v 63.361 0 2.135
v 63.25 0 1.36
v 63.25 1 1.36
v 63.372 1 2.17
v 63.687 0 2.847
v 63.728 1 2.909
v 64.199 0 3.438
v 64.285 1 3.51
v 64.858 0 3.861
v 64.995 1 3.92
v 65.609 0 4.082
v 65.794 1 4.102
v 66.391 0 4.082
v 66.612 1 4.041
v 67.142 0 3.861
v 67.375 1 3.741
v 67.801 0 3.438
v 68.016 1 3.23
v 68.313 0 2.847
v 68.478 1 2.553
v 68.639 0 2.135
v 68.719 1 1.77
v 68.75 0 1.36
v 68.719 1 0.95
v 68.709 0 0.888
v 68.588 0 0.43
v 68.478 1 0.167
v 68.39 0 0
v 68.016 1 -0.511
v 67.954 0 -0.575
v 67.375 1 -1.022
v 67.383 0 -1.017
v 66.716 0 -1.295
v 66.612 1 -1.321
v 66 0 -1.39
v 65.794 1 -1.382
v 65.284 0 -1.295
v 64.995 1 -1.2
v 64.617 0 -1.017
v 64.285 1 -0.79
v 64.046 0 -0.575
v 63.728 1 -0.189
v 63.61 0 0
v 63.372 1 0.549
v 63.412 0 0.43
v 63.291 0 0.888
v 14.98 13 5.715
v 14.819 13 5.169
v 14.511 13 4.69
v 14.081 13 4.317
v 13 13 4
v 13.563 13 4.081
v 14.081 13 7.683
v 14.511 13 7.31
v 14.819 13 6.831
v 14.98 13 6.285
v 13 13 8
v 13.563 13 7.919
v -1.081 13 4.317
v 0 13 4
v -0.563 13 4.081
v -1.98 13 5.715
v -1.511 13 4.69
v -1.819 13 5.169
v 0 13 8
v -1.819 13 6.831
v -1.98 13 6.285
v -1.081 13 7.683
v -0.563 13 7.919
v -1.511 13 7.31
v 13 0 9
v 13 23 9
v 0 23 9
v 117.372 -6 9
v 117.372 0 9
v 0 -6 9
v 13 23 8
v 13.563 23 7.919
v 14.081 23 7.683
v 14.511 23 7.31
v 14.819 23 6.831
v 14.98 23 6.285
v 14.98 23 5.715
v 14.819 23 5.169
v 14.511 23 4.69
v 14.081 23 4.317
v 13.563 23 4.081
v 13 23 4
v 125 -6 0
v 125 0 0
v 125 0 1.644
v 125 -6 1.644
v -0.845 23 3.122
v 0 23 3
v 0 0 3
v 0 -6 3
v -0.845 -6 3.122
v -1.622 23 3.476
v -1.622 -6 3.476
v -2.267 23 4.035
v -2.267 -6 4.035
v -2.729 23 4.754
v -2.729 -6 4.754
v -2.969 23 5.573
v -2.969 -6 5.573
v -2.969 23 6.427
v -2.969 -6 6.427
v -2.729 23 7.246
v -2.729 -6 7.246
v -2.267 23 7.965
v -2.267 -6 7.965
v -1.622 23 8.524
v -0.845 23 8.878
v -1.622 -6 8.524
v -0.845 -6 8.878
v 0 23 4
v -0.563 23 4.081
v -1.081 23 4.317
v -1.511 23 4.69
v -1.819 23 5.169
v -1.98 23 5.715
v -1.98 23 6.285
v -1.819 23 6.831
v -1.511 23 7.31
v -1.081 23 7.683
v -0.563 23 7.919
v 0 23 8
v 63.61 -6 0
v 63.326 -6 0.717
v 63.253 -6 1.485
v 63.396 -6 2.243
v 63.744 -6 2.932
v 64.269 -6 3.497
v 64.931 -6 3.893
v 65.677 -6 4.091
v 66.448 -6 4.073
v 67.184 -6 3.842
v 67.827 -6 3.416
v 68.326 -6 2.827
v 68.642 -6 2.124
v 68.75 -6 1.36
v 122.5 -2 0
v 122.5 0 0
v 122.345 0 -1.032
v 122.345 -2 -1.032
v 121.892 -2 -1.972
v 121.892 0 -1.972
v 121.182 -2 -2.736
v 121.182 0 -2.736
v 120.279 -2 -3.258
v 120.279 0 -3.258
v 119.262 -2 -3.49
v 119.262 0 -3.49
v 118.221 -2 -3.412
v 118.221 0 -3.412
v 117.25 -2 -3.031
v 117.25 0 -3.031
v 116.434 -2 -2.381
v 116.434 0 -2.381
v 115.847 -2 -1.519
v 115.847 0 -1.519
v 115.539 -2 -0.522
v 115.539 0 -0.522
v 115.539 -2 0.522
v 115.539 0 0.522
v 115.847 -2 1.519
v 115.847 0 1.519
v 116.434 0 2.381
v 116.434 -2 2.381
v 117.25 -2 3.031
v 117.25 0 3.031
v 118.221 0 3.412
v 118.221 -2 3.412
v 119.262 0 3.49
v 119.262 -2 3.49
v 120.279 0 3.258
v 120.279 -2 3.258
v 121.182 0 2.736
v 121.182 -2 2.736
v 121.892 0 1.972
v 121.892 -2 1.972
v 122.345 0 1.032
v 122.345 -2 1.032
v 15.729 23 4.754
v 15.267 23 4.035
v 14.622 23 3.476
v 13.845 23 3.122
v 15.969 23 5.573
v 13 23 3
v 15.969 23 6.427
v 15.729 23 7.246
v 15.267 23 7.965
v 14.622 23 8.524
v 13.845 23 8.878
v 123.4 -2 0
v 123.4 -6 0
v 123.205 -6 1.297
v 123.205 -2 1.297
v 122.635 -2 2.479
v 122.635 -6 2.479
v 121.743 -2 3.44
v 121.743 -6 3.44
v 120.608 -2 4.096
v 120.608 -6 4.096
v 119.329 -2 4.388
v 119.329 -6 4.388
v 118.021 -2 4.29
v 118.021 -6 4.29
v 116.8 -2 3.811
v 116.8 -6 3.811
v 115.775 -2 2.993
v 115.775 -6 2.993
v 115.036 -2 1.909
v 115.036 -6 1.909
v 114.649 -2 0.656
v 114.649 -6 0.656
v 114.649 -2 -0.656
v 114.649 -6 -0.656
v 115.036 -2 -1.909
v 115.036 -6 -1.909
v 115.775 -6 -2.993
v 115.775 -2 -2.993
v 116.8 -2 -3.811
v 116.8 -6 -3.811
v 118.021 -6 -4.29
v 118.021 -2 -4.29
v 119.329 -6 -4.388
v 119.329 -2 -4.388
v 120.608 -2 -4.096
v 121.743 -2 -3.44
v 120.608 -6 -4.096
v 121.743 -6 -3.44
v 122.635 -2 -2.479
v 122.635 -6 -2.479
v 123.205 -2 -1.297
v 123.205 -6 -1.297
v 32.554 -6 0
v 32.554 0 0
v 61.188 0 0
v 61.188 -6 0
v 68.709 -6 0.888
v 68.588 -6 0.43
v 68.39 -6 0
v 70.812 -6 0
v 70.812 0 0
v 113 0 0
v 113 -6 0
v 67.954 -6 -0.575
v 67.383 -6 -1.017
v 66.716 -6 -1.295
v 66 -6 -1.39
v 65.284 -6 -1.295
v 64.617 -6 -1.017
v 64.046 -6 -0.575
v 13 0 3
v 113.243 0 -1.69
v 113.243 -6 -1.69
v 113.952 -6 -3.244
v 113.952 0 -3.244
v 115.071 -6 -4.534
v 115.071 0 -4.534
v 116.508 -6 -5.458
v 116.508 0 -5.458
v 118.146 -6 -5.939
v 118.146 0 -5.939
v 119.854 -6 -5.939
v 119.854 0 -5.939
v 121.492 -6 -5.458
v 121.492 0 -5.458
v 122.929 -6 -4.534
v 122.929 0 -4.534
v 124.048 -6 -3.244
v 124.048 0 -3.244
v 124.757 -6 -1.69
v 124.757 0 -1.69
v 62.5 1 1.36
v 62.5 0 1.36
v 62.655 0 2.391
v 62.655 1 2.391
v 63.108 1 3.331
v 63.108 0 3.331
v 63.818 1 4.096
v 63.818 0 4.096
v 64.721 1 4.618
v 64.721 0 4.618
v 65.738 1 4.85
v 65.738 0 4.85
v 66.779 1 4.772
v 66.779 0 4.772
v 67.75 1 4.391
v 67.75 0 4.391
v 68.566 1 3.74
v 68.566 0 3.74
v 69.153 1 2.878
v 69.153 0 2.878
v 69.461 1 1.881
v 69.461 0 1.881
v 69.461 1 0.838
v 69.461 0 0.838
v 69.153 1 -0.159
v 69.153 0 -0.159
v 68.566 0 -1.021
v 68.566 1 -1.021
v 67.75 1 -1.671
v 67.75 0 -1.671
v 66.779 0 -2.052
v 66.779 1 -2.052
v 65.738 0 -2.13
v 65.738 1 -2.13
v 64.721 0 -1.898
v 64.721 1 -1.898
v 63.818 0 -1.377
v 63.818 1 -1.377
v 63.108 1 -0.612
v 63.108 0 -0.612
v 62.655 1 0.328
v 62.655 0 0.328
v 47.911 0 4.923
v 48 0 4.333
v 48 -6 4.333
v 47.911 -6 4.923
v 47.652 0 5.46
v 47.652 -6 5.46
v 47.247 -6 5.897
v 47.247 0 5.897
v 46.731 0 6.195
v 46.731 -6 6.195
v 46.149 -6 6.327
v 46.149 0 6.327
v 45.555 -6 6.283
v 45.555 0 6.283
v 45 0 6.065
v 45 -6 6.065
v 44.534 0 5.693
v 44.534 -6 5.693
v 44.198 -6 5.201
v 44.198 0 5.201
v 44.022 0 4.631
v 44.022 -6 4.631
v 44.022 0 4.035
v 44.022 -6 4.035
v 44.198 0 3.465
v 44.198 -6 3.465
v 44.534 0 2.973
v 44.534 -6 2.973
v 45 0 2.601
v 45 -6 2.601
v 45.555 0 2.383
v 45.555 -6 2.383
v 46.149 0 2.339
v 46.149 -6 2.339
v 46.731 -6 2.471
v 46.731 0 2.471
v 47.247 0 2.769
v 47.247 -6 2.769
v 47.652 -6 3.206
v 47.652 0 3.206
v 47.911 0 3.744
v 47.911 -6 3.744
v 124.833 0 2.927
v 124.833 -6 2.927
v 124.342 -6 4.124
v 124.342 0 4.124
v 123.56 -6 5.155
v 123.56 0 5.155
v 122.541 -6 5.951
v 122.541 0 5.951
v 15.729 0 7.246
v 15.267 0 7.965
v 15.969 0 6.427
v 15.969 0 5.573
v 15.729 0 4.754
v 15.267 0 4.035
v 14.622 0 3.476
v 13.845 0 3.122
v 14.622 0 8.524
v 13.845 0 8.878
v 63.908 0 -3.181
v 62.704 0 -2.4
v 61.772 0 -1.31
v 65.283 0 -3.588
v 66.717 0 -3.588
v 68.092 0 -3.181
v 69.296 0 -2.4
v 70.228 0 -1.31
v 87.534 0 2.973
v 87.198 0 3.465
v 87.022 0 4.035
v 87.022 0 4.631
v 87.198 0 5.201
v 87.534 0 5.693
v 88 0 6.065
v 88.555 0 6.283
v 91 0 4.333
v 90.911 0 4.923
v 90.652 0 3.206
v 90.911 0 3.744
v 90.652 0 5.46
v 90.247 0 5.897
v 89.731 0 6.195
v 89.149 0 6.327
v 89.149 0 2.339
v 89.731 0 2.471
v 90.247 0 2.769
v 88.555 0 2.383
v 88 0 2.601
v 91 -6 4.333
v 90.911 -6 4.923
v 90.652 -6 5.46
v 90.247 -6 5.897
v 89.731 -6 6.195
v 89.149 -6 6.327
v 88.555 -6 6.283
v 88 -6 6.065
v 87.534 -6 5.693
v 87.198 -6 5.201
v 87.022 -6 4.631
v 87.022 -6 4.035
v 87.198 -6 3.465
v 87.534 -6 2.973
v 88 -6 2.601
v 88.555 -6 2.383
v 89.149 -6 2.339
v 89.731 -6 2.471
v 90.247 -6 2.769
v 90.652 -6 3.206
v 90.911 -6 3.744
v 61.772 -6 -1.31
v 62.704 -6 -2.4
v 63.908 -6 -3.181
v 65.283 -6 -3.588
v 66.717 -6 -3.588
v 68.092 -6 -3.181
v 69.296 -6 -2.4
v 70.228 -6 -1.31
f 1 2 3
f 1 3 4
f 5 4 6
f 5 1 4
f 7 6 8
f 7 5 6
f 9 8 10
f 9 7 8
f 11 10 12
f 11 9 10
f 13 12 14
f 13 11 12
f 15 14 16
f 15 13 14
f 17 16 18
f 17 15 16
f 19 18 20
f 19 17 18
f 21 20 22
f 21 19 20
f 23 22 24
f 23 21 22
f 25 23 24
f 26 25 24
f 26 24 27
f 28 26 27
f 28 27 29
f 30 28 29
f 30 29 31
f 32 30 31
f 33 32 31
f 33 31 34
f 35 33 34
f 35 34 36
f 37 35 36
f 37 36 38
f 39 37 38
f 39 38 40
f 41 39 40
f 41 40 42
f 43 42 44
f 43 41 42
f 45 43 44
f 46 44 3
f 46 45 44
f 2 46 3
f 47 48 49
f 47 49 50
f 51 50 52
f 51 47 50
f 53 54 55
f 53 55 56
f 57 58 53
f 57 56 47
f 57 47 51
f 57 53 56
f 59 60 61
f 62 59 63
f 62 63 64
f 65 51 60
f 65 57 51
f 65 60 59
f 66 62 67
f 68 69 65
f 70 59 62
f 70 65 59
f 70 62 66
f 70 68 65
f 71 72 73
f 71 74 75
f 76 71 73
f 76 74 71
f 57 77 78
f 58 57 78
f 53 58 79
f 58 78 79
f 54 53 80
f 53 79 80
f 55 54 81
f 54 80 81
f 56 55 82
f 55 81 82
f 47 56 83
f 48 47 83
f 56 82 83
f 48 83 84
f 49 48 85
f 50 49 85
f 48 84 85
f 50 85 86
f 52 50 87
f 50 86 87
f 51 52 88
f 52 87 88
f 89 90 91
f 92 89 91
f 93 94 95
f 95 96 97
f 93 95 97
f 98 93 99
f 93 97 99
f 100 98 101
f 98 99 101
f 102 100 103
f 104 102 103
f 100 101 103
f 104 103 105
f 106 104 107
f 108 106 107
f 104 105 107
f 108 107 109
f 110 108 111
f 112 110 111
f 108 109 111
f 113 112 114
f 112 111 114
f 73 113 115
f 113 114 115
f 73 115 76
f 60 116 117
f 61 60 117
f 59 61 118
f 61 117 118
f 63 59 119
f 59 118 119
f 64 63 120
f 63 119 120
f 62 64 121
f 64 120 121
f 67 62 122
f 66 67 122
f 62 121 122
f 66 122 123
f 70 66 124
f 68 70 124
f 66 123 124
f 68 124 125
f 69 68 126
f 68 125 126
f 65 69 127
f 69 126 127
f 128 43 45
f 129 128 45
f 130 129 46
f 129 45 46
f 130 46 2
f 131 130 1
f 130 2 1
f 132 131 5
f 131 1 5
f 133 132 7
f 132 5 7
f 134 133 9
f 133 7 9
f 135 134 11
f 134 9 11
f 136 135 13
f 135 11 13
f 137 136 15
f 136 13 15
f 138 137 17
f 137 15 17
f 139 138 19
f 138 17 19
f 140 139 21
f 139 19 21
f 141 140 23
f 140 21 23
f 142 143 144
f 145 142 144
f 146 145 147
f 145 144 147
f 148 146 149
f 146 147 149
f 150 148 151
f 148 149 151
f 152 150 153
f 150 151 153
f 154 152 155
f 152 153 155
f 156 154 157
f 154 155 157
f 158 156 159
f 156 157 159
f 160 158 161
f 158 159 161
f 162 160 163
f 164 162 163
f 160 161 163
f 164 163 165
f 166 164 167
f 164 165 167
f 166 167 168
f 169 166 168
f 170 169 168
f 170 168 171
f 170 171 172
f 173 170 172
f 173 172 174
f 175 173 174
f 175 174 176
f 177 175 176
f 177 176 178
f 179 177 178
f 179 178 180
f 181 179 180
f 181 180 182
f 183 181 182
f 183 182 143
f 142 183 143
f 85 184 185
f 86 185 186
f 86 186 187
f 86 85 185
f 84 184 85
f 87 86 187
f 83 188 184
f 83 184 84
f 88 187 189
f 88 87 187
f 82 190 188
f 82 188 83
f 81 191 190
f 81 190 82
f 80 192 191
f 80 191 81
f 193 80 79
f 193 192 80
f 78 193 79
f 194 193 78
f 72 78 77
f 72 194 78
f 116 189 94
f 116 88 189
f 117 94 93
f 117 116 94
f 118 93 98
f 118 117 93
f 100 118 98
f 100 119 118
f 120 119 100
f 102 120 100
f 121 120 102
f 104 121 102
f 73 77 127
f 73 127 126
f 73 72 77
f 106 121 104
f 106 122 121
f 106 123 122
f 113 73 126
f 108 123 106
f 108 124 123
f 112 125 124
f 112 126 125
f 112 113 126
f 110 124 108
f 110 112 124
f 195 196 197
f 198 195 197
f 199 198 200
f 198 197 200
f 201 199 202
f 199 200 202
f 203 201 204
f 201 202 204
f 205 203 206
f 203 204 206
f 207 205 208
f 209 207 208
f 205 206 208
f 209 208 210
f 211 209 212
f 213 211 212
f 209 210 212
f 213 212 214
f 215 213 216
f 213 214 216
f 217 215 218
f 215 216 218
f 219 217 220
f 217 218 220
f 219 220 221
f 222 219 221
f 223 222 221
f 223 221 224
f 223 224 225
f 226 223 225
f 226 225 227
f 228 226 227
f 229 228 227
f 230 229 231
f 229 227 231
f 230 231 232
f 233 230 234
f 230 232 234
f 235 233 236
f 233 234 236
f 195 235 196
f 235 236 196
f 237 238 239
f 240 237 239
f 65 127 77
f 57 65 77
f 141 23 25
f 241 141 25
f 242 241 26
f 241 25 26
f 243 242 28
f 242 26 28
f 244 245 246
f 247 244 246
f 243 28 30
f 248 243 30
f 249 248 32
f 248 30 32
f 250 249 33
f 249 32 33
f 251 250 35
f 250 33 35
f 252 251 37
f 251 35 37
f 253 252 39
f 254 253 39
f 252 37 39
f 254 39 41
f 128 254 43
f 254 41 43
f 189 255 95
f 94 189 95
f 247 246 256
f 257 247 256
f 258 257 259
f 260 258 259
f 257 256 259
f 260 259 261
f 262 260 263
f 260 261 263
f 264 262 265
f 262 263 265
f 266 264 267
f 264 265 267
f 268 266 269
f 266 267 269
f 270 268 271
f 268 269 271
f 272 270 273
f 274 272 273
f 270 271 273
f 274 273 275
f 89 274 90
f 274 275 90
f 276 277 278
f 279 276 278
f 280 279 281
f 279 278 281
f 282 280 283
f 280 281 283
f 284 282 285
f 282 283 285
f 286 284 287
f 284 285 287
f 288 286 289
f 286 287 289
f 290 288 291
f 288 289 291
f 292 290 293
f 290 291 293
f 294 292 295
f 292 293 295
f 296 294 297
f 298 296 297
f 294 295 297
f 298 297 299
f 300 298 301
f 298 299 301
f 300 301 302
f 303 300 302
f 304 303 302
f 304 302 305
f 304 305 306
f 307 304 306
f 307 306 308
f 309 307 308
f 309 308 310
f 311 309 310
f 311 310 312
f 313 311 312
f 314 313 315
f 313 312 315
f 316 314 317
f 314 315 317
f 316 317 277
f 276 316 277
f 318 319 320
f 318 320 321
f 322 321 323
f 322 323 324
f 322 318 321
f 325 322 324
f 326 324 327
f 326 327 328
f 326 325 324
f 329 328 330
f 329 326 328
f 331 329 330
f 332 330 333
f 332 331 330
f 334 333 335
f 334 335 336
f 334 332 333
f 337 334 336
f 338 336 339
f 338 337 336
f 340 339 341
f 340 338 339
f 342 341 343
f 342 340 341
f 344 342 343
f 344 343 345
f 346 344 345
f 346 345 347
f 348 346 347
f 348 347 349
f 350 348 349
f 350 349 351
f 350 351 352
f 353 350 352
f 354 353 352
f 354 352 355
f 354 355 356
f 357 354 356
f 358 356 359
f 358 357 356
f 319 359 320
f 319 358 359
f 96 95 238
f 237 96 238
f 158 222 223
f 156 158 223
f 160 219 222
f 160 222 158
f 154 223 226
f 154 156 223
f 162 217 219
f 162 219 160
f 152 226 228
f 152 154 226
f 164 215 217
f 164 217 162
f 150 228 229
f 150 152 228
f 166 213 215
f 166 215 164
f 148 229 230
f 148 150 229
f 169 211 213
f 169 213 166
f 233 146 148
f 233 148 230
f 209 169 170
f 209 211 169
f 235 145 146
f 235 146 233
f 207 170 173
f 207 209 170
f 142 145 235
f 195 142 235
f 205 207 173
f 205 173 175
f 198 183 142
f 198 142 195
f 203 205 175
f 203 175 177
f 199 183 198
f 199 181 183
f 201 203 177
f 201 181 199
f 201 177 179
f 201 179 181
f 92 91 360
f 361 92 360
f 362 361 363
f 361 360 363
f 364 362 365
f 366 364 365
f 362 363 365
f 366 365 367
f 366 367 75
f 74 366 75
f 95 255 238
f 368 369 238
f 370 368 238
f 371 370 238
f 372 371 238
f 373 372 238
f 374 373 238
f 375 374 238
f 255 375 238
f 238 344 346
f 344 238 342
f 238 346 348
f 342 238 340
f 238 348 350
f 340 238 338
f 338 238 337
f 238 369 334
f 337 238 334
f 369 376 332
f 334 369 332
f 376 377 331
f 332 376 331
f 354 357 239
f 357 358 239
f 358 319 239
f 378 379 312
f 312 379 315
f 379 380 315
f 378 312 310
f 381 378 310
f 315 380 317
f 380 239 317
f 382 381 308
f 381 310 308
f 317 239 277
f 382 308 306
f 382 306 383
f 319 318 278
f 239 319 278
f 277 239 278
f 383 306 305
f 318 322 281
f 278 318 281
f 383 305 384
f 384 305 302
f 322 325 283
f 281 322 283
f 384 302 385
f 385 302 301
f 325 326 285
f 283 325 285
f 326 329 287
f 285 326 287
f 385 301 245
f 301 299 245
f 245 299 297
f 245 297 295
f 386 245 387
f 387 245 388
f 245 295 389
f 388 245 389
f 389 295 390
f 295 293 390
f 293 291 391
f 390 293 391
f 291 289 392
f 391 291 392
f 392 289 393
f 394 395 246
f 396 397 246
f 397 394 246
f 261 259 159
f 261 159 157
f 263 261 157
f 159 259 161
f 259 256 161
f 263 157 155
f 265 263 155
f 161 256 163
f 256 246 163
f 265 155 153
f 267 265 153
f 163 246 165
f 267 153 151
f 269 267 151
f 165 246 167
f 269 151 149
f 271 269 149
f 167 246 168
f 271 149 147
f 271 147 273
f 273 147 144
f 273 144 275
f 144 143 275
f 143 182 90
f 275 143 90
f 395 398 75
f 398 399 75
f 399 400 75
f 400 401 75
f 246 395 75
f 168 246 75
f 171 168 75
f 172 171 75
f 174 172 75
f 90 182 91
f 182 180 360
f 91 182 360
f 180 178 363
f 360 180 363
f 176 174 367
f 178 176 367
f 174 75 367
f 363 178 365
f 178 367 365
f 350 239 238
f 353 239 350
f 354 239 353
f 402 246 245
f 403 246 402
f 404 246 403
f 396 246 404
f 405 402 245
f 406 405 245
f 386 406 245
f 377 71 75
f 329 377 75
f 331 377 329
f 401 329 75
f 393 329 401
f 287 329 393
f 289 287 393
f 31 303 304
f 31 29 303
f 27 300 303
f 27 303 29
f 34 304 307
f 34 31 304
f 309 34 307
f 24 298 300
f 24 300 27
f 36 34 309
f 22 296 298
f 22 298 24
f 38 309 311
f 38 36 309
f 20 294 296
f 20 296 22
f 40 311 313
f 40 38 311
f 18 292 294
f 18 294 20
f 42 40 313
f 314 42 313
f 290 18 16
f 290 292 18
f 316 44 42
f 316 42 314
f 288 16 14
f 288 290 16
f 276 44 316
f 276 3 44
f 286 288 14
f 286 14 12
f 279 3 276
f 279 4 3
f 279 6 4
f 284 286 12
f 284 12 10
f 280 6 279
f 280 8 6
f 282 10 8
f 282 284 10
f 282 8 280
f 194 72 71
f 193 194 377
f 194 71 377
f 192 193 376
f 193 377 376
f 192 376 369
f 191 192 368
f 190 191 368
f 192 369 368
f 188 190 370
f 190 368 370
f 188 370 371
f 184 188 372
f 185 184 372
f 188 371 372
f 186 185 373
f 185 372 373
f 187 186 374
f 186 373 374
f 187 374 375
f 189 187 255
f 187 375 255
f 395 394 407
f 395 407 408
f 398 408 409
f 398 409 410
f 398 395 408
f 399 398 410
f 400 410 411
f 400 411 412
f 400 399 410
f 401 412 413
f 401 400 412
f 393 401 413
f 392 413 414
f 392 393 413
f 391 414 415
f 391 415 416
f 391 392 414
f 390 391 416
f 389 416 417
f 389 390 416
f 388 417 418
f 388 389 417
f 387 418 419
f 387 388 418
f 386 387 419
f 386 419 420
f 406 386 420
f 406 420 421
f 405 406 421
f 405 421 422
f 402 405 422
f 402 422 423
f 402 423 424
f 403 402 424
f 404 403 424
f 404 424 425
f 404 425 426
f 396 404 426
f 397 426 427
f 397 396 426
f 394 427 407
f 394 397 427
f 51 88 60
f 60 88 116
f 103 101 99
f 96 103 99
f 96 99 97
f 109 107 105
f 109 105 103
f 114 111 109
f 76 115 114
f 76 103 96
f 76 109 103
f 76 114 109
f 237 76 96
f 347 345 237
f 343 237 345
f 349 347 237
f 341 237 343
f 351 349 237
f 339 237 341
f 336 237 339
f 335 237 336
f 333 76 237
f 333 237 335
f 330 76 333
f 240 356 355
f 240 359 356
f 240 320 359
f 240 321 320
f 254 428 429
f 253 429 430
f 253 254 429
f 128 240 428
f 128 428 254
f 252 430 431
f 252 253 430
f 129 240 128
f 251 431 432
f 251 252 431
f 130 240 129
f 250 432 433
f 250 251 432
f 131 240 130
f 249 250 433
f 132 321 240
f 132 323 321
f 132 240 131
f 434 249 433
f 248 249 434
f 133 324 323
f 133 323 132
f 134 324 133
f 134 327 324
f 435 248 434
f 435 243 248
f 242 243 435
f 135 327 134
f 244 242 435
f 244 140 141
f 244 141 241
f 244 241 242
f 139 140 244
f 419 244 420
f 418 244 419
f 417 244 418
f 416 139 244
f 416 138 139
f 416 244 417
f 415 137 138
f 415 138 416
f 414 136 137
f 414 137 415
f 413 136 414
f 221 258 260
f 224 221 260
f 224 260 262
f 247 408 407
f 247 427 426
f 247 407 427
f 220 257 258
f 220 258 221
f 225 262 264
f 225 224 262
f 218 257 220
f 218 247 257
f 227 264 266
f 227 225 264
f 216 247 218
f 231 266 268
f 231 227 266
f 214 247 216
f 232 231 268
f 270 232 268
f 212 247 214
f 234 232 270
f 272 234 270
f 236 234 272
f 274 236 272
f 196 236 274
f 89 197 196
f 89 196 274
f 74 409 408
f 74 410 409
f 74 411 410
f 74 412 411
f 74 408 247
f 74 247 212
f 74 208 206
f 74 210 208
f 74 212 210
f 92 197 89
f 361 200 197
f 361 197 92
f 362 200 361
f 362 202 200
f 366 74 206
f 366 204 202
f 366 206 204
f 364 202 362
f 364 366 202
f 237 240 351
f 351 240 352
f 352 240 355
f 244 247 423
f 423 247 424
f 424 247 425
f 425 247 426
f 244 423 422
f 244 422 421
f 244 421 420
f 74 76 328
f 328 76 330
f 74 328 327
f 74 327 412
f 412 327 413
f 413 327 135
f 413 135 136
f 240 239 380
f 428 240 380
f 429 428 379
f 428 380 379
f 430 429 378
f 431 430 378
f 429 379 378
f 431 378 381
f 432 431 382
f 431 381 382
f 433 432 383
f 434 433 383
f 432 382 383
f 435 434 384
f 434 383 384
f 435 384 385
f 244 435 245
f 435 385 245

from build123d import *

# Parameters (mm, degrees)
F0_R     = 2
F1_DEPTH = 6
F2_R     = 3.5
F2_R_2   = 2.75
F3_DEPTH = 1
F4_R     = 4.4
F5_DEPTH = 4
F6_W     = 13
F6_H     = 6
F7_DEPTH = 23
F9_DEPTH = 10


with BuildPart() as f1:
    # F0 (on Front) → F1 (new body)
    with BuildSketch(Plane.XZ):
        with BuildLine():
            Line((0, 3), (32.554146, 0))
            Line((32.554146, 0), (61.188469, 0))
            Line((61.188469, 0), (63.609742, 0))
            ThreePointArc((63.609742, 0), (65.29669, 4.018384), (68.75, 1.359841))
            ThreePointArc((68.75, 1.359841), (68.658544, 0.65653), (68.390258, 0))
            Line((68.390258, 0), (70.811531, 0))
            Line((70.811531, 0), (113, 0))
            Line((113, 0), (115.5, 0))
            ThreePointArc((115.5, 0), (119, 3.5), (122.5, 0))
            Line((122.5, 0), (125, 0))
            Line((125, 0), (125, 1.644468))
            ThreePointArc((125, 1.644468), (124.341818, 4.124108), (122.540554, 5.950927))
            Line((122.540554, 5.950927), (117.372112, 9))
            Line((117.372112, 9), (0, 9))
            Line((0, 9), (0, 3))
        make_face()
        with Locations((46, 4.333029)):
            Circle(F0_R, mode=Mode.SUBTRACT)
        with Locations((89, 4.333029)):
            Circle(F0_R, mode=Mode.SUBTRACT)
        with BuildLine():
            Line((63.609742, 0), (61.188469, 0))
            ThreePointArc((61.188469, 0), (66, -3.640159), (70.811531, 0))
            Line((70.811531, 0), (68.390258, 0))
            ThreePointArc((68.390258, 0), (66, -1.390159), (63.609742, 0))
        make_face()
        with BuildLine():
            ThreePointArc((0, 9), (-3, 6), (0, 3))
            Line((0, 3), (0, 9))
        make_face()
        with BuildLine():
            Line((115.5, 0), (113, 0))
            ThreePointArc((113, 0), (119, -6), (125, 0))
            Line((125, 0), (122.5, 0))
            ThreePointArc((122.5, 0), (119, -3.5), (115.5, 0))
        make_face()
    extrude(amount=F1_DEPTH)

    # F2 (on face) → F3 (join)
    with BuildSketch(Plane(origin=(0, 0, 0), x_dir=(-1, 0, 0), z_dir=(0, 1, 0))):
        with Locations((-66, 1.359841)):
            Circle(F2_R)
        with Locations((-66, 1.359841)):
            Circle(F2_R_2, mode=Mode.SUBTRACT)
    extrude(amount=F3_DEPTH)

    # F4 (on face) → F5 (cut)
    with BuildSketch(Plane.XZ.offset(6)):
        with Locations((119, 0)):
            Circle(F4_R)
    extrude(amount=-F5_DEPTH, mode=Mode.SUBTRACT)

    # F6 (on face) → F7 (join)
    with BuildSketch(Plane(origin=(0, 0, 0), x_dir=(-1, 0, 0), z_dir=(0, 1, 0))):
        with BuildLine():
            Line((0, 9), (0, 3))
            ThreePointArc((0, 3), (3, 6), (0, 9))
        make_face()
        with Locations((-6.5, 6)):
            Rectangle(F6_W, F6_H)
        with BuildLine():
            ThreePointArc((-13, 9), (-16, 6), (-13, 3))
            Line((-13, 3), (-13, 9))
        make_face()
    extrude(amount=F7_DEPTH)

    # F8 (on face) → F9 (cut)
    with BuildSketch(Plane(origin=(0, 23, 0), x_dir=(-1, 0, 0), z_dir=(0, 1, 0))):
        with BuildLine():
            Line((0, 8), (-13, 8))
            ThreePointArc((-13, 8), (-15, 6), (-13, 4))
            Line((-13, 4), (0, 4))
            ThreePointArc((0, 4), (2, 6), (0, 8))
        make_face()
    extrude(amount=-F9_DEPTH, mode=Mode.SUBTRACT)


solid = f1.part
